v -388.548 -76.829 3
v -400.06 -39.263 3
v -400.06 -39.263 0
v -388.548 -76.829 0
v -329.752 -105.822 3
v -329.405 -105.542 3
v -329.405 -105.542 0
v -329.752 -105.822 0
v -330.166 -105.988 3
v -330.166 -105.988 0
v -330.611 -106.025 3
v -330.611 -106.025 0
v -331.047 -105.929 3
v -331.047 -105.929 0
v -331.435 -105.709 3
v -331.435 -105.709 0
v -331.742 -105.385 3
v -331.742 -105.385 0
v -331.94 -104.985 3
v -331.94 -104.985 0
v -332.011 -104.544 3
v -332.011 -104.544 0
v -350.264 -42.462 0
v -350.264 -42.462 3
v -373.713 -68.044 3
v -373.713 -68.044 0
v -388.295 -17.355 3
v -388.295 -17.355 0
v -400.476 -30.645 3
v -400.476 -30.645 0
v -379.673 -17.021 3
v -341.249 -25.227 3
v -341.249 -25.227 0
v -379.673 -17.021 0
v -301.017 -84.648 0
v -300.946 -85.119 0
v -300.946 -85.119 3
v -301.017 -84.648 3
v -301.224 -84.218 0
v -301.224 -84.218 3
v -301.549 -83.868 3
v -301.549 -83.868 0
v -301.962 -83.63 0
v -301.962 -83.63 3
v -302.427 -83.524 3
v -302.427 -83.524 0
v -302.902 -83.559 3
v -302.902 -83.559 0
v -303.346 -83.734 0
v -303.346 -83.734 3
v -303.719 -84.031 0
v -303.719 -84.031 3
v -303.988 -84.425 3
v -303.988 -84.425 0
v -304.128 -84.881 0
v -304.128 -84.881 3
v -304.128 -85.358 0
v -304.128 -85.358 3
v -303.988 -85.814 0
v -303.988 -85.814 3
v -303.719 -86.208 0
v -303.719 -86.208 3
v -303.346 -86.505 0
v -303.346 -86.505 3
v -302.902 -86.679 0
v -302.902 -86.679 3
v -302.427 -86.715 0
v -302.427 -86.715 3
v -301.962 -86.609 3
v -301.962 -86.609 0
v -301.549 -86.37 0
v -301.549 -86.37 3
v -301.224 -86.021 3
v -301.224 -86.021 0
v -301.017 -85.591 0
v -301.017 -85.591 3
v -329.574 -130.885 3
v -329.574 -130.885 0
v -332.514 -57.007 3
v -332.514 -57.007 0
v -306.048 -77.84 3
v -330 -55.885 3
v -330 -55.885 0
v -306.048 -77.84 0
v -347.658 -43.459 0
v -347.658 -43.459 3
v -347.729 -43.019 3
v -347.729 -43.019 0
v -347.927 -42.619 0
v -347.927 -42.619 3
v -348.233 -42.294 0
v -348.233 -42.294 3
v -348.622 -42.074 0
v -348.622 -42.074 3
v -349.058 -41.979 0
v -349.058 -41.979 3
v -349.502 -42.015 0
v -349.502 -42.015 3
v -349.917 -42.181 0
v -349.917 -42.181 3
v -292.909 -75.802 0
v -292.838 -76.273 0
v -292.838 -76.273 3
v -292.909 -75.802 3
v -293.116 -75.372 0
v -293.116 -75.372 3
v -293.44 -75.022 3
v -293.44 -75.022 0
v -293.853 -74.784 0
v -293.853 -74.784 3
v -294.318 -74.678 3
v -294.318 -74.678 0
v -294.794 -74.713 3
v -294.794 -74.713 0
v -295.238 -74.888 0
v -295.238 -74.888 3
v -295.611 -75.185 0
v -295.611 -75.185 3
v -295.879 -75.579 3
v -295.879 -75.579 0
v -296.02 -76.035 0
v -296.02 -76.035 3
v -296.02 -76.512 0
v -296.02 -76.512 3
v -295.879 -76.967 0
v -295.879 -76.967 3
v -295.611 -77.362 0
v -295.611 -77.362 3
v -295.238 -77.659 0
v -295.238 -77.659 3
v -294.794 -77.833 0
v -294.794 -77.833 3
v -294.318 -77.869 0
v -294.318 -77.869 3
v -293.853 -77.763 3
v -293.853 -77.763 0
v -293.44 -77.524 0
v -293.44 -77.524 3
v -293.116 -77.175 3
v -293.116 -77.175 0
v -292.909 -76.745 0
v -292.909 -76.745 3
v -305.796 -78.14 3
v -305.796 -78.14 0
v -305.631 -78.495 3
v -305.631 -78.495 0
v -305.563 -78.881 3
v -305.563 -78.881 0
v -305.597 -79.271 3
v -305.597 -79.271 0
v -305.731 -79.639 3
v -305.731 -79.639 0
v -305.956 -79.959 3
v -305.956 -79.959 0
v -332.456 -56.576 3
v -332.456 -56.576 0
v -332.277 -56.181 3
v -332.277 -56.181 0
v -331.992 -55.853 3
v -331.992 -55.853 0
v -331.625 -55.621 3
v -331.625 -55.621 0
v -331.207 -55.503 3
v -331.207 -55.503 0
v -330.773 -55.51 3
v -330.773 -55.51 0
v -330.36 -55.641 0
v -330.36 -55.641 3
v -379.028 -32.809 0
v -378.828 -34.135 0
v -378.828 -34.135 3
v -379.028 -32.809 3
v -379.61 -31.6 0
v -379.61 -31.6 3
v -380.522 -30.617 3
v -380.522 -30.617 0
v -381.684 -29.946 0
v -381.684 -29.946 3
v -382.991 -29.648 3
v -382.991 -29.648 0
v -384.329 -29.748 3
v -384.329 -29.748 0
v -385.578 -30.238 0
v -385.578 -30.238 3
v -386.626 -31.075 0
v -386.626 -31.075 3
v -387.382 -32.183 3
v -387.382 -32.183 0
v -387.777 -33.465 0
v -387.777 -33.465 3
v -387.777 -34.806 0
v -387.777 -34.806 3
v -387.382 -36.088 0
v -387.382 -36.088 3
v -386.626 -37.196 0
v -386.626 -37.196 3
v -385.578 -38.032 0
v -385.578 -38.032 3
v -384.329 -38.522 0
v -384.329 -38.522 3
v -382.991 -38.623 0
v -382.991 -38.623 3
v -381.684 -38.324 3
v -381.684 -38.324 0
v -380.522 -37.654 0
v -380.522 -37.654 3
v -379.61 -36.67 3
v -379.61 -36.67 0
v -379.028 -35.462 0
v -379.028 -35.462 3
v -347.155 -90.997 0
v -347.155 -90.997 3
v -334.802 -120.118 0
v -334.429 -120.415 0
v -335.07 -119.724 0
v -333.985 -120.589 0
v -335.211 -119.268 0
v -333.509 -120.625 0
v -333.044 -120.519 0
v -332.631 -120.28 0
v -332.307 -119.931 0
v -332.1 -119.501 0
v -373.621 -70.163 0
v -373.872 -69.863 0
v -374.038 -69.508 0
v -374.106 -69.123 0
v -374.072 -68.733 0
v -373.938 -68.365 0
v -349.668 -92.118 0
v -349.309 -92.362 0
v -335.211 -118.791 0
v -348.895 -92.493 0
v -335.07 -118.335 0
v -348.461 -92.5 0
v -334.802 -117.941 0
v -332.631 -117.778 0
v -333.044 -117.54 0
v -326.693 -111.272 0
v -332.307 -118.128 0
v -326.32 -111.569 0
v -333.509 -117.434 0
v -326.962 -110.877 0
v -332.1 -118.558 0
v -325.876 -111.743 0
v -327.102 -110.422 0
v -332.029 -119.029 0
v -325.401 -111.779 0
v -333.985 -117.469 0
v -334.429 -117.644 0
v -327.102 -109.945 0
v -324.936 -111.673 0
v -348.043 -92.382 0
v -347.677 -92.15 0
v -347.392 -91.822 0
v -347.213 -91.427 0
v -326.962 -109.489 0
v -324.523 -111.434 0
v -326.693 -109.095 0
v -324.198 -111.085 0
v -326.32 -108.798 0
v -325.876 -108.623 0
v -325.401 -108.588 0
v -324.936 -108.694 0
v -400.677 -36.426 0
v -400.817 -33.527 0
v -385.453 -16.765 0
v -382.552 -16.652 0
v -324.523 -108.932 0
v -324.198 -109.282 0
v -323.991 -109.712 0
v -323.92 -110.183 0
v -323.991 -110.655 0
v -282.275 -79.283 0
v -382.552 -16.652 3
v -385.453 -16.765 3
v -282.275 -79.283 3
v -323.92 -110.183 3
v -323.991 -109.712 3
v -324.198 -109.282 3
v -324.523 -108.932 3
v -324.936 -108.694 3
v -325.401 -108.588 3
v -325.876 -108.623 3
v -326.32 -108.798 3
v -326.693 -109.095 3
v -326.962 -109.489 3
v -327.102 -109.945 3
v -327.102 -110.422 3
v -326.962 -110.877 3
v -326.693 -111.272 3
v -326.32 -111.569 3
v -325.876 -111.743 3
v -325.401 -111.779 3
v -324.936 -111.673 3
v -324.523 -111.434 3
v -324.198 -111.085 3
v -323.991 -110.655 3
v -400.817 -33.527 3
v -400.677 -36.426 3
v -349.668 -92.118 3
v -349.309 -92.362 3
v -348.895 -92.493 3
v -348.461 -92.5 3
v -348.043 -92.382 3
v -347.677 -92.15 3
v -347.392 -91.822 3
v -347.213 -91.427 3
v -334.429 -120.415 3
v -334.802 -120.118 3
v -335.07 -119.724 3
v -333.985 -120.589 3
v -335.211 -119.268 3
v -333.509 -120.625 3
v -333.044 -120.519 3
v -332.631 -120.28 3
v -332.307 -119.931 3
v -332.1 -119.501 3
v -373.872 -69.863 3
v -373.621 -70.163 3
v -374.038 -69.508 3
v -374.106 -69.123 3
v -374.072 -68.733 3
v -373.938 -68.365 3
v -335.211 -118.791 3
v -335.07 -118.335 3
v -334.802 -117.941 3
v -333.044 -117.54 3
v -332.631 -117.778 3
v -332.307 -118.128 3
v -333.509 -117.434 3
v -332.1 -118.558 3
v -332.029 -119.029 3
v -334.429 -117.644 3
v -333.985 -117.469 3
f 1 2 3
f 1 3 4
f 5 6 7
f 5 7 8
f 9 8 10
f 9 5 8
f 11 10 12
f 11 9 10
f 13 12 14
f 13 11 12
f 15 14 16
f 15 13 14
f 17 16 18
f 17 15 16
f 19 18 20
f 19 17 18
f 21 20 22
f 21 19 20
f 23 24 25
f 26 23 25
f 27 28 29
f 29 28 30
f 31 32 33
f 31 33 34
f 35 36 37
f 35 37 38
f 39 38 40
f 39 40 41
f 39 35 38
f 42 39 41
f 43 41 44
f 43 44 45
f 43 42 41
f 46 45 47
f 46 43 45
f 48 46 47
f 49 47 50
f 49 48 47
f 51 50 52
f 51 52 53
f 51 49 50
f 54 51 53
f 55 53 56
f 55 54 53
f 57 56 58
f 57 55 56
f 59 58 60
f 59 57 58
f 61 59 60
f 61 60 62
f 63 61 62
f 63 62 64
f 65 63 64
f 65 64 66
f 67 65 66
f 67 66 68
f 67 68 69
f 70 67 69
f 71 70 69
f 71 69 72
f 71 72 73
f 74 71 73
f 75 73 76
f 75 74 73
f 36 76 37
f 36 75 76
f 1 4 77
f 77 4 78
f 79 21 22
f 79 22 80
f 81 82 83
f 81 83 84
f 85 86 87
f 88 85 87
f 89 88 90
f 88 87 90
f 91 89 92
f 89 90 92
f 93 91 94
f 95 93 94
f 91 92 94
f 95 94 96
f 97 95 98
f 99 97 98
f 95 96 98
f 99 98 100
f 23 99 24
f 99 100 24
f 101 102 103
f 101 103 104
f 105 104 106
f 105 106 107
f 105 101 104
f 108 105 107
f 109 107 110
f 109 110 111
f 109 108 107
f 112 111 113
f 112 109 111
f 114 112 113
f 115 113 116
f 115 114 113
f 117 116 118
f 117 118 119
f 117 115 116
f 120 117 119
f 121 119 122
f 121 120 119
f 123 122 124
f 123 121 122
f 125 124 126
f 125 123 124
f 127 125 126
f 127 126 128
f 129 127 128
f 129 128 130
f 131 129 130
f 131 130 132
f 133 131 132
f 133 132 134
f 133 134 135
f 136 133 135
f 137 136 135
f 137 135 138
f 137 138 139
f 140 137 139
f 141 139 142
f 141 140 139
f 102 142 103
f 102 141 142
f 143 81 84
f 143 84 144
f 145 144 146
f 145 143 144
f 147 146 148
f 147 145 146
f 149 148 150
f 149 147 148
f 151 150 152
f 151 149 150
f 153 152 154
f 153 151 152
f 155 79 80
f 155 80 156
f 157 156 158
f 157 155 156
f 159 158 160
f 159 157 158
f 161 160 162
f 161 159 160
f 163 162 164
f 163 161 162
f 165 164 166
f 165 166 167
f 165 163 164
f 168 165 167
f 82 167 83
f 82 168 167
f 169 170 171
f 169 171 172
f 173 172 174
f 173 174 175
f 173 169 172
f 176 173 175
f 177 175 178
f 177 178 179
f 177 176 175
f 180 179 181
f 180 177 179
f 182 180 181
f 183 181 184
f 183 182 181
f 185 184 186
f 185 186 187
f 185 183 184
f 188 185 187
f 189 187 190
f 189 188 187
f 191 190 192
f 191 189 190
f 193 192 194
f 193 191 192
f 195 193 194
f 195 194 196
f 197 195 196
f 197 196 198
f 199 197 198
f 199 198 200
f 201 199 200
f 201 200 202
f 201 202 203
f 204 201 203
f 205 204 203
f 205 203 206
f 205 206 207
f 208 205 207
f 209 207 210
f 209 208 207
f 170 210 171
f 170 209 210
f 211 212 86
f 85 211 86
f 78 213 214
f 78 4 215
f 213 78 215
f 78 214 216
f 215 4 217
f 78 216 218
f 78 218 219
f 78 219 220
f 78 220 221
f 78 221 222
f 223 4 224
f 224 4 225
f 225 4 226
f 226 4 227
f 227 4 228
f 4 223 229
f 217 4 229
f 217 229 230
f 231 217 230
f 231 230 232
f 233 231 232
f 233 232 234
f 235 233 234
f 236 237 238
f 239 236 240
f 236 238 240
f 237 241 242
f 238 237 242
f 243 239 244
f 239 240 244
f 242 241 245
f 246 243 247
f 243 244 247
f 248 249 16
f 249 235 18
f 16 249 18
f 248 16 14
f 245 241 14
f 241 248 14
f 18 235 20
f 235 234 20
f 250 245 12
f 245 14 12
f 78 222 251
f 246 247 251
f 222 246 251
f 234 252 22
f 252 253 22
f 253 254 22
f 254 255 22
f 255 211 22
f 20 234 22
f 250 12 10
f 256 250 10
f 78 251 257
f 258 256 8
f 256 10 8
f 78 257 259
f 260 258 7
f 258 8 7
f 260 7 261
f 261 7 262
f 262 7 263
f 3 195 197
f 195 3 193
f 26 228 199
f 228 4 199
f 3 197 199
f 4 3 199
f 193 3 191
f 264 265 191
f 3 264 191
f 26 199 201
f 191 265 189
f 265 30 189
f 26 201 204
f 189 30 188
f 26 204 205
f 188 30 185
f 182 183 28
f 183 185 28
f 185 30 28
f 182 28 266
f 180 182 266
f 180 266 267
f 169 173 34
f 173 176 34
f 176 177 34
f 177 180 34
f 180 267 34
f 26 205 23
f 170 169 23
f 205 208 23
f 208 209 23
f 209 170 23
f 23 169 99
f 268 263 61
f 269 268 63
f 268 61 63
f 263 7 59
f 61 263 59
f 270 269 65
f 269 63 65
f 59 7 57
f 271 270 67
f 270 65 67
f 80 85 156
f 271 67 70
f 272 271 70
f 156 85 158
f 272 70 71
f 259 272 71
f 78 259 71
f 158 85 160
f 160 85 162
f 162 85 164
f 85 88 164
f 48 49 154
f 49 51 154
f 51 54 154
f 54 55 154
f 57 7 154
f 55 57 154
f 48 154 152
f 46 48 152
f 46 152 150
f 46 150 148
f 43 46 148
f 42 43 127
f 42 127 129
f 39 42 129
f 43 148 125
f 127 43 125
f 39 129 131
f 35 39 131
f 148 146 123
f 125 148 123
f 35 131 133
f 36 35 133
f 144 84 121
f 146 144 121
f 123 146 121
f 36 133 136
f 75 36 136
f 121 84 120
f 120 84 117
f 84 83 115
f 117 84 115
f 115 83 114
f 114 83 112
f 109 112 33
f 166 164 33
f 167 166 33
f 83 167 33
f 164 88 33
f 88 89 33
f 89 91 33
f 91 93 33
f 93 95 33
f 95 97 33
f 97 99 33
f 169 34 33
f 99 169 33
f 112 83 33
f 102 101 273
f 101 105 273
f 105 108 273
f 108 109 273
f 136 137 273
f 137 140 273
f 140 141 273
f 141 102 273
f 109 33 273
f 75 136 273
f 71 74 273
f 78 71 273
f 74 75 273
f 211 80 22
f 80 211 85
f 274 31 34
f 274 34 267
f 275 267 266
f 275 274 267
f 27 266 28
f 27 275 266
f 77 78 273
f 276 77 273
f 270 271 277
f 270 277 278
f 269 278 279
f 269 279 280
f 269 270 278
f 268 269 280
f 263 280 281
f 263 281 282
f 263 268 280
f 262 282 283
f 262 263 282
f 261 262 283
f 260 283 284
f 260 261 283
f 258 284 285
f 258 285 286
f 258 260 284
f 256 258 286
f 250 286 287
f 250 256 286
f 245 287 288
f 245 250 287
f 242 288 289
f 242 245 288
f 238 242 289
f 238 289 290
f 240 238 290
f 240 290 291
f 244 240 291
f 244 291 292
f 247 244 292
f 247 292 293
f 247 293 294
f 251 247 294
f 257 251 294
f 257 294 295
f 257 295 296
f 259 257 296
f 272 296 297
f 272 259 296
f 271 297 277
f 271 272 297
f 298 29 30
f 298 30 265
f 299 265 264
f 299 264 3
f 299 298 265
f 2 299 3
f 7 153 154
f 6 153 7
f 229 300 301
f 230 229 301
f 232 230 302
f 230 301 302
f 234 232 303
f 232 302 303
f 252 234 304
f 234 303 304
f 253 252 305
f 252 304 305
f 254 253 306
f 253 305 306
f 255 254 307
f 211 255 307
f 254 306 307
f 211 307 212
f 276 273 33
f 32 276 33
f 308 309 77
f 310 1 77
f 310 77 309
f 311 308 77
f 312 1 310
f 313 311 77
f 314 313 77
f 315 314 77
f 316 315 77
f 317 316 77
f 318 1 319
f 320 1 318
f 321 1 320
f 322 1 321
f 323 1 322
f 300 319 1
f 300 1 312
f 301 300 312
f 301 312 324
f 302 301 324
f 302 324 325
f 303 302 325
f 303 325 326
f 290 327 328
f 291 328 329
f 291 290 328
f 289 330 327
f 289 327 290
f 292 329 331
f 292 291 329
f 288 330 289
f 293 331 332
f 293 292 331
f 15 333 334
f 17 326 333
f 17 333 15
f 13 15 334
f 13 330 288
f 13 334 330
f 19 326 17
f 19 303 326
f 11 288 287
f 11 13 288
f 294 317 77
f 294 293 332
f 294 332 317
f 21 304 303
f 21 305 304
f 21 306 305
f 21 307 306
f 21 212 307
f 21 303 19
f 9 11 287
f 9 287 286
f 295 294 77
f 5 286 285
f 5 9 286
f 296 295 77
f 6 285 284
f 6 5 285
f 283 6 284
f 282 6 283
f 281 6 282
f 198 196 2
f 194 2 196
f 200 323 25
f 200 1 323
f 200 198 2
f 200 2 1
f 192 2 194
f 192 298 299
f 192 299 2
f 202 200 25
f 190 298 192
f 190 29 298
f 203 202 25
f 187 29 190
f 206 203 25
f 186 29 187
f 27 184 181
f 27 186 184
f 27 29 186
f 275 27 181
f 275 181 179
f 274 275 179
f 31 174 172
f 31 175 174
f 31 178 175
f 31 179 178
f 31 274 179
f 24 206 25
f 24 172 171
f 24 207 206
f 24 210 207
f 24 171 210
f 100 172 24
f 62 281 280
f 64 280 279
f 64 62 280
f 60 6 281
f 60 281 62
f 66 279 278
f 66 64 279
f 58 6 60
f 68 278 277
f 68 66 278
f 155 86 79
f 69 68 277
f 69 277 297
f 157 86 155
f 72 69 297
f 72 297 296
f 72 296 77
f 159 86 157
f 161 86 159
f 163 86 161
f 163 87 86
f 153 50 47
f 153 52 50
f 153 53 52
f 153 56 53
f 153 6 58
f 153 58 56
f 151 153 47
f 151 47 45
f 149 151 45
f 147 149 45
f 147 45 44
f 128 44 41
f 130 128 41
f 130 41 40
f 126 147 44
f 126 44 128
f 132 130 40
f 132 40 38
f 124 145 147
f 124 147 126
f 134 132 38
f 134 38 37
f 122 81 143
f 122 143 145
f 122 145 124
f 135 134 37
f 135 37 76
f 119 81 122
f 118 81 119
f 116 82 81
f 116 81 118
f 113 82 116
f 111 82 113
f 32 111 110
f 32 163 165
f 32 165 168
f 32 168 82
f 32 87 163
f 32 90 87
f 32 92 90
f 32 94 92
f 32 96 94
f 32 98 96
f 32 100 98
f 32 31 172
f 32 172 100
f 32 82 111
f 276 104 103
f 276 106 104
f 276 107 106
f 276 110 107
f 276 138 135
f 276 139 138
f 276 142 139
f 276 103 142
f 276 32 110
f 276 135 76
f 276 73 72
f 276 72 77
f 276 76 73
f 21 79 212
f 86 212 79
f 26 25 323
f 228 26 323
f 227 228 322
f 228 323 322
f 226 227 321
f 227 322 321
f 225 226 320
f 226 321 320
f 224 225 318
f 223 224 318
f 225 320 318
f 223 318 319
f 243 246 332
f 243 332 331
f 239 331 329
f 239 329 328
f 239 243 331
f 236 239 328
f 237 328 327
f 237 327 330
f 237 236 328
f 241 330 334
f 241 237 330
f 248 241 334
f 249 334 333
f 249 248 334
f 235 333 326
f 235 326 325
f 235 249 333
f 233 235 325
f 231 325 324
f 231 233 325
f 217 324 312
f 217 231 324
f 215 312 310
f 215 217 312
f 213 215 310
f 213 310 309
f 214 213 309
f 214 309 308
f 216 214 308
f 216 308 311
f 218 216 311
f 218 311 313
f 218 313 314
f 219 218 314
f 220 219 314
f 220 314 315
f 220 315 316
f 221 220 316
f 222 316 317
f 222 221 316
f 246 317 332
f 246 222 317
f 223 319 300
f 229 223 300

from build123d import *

# Parameters (mm, degrees)
SKETCH_1_R         = 4.5
SKETCH_1_R_2       = 1.6
EXTRUDE_1_DEPTH    = 3
CUT_EXTRUDE1_DEPTH = 3


with BuildPart() as part:
    # 草图1 → 凸台-拉伸1 (new body)
    with BuildSketch(Plane.XY):
        Polygon((-329.573940975, -130.885149725), (-282.274763971, -79.282941877), (-355.992203754, -11.712689014), (-384.249742283, -12.942126399), (-404.520818142, -35.057358334), (-403.291380758, -63.314896863), align=None)
        with Locations((-383.327664245, -34.135280295)):
            Circle(SKETCH_1_R, mode=Mode.SUBTRACT)
        with Locations((-333.628644179, -119.029375523)):
            Circle(SKETCH_1_R_2, mode=Mode.SUBTRACT)
        with Locations((-325.520213836, -110.183282749)):
            Circle(SKETCH_1_R_2, mode=Mode.SUBTRACT)
        with Locations((-302.546327862, -85.119353223)):
            Circle(SKETCH_1_R_2, mode=Mode.SUBTRACT)
        with Locations((-294.437897519, -76.273260449)):
            Circle(SKETCH_1_R_2, mode=Mode.SUBTRACT)
    extrude(amount=EXTRUDE_1_DEPTH)

    # Sketch1 → Cut-Extrude1 (cut)
    with BuildSketch(Plane.XY.offset(3)):
        with BuildLine():
            Line((-400.059680241, -39.262622756), (-388.547892801, -76.828947435))
            Line((-388.547892801, -76.828947435), (-464.128258323, -22.526868134))
            Line((-464.128258323, -22.526868134), (-423.376063206, 22.684533744))
            Line((-423.376063206, 22.684533744), (-334.935129122, 6.829576373))
            Line((-334.935129122, 6.829576373), (-341.248715798, -25.226739587))
            Line((-341.248715798, -25.226739587), (-379.672909098, -17.021170187))
            ThreePointArc((-379.672909098, -17.021170187), (-396.228216207, -22.310486045), (-400.059680241, -39.262622756))
        make_face()
        with BuildLine():
            Line((-373.620721286, -70.163397904), (-349.668317732, -92.118446391))
            ThreePointArc((-349.668317732, -92.118446391), (-348.043488399, -92.382481208), (-347.154848014, -90.996803392))
            Line((-347.154848014, -90.996803392), (-347.658183177, -43.459413358))
            ThreePointArc((-347.658183177, -43.459413358), (-348.621743848, -42.074465348), (-350.263860698, -42.461740967))
            Line((-350.263860698, -42.461740967), (-373.71292909, -68.044082514))
            ThreePointArc((-373.71292909, -68.044082514), (-374.105749776, -69.12283707), (-373.620721286, -70.163397904))
        make_face()
        with BuildLine():
            Line((-330.000431814, -55.885012577), (-306.04802826, -77.840061064))
            ThreePointArc((-306.04802826, -77.840061064), (-305.56299977, -78.880621898), (-305.955820457, -79.959376454))
            Line((-305.955820457, -79.959376454), (-329.404888848, -105.541718001))
            ThreePointArc((-329.404888848, -105.541718001), (-331.047005699, -105.92899362), (-332.010566369, -104.544045611))
            Line((-332.010566369, -104.544045611), (-332.513901532, -57.006655576))
            ThreePointArc((-332.513901532, -57.006655576), (-331.625261147, -55.62097776), (-330.000431814, -55.885012577))
        make_face()
    extrude(amount=-CUT_EXTRUDE1_DEPTH, mode=Mode.SUBTRACT)


solid = part.part
